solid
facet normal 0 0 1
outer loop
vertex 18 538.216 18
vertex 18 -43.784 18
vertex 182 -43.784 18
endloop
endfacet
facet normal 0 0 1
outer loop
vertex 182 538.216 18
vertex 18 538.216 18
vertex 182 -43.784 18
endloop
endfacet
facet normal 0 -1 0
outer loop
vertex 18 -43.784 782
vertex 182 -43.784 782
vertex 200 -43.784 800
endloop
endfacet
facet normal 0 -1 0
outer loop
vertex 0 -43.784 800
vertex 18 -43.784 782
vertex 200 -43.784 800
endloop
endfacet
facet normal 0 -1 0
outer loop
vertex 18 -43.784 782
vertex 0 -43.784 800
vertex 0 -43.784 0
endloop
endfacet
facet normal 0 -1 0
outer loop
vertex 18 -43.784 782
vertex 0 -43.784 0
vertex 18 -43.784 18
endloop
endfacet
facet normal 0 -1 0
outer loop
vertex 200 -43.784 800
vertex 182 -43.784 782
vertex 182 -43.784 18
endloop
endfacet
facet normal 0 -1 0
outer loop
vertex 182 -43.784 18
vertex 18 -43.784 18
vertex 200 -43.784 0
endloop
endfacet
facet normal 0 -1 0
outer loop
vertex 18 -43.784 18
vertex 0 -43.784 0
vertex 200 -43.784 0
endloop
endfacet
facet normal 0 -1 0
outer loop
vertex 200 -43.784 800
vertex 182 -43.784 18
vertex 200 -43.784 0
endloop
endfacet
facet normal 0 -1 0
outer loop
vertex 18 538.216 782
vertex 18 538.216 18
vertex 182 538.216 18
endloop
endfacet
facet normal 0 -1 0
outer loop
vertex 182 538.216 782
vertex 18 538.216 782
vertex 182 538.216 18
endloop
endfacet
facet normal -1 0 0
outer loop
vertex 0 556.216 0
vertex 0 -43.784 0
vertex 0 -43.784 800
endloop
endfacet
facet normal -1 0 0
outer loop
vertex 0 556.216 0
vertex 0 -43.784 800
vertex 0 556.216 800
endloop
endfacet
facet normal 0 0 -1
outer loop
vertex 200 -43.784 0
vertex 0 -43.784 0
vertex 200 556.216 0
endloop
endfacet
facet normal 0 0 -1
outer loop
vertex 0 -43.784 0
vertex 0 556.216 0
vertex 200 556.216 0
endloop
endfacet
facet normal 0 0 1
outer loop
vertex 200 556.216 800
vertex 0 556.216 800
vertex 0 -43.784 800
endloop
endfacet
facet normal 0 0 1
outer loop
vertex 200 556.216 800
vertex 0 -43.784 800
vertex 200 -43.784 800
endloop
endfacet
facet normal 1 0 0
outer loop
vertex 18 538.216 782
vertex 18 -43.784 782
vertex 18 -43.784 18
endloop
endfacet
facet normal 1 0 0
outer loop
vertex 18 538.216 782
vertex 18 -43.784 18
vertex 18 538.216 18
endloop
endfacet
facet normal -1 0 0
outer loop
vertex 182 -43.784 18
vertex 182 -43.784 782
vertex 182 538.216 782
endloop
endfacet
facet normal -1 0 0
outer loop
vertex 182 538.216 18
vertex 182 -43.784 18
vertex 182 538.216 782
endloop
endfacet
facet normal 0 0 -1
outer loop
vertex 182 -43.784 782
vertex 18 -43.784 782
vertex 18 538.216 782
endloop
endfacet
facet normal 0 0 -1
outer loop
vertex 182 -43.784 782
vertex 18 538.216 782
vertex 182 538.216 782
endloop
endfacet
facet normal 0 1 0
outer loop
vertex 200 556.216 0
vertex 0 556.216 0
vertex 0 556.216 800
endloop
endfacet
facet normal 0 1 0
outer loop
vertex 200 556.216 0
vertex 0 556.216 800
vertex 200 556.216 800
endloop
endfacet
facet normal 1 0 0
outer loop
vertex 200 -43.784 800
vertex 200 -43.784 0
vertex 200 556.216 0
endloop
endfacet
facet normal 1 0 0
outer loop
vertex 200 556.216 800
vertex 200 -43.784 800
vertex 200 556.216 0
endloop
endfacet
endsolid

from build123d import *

# Parameters (mm, degrees)
F0_W     = 43.043024838
F0_H     = 43.7836721539
F1_DEPTH = 800
F2_DEPTH = 200
F3_DEPTH = 600
F4_T     = -18


with BuildPart() as f1:
    # F0 (on Top) → F1 (new body)
    with BuildSketch(Plane.XY):
        with Locations((21.521512419, -21.891836077)):
            Rectangle(F0_W, F0_H)
    extrude(amount=F1_DEPTH)

    # F2 (add): a face of the model
    f2_faces = [f1.faces().sort_by_distance(p)[0] for p in [
        (0, -21.891836077, 400),
    ]]
    extrude(f2_faces, amount=-F2_DEPTH)

    # F3 (add): a face of the model
    f3_faces = [f1.faces().sort_by_distance(p)[0] for p in [
        (100, -43.7836721539, 400),
    ]]
    extrude(f3_faces, amount=-F3_DEPTH)

    # F4
    f4_openings = [f1.faces().sort_by_distance(p)[0] for p in [
        (100, -43.783672, 400),
    ]]
    offset(amount=F4_T, openings=f4_openings)


solid = f1.part
